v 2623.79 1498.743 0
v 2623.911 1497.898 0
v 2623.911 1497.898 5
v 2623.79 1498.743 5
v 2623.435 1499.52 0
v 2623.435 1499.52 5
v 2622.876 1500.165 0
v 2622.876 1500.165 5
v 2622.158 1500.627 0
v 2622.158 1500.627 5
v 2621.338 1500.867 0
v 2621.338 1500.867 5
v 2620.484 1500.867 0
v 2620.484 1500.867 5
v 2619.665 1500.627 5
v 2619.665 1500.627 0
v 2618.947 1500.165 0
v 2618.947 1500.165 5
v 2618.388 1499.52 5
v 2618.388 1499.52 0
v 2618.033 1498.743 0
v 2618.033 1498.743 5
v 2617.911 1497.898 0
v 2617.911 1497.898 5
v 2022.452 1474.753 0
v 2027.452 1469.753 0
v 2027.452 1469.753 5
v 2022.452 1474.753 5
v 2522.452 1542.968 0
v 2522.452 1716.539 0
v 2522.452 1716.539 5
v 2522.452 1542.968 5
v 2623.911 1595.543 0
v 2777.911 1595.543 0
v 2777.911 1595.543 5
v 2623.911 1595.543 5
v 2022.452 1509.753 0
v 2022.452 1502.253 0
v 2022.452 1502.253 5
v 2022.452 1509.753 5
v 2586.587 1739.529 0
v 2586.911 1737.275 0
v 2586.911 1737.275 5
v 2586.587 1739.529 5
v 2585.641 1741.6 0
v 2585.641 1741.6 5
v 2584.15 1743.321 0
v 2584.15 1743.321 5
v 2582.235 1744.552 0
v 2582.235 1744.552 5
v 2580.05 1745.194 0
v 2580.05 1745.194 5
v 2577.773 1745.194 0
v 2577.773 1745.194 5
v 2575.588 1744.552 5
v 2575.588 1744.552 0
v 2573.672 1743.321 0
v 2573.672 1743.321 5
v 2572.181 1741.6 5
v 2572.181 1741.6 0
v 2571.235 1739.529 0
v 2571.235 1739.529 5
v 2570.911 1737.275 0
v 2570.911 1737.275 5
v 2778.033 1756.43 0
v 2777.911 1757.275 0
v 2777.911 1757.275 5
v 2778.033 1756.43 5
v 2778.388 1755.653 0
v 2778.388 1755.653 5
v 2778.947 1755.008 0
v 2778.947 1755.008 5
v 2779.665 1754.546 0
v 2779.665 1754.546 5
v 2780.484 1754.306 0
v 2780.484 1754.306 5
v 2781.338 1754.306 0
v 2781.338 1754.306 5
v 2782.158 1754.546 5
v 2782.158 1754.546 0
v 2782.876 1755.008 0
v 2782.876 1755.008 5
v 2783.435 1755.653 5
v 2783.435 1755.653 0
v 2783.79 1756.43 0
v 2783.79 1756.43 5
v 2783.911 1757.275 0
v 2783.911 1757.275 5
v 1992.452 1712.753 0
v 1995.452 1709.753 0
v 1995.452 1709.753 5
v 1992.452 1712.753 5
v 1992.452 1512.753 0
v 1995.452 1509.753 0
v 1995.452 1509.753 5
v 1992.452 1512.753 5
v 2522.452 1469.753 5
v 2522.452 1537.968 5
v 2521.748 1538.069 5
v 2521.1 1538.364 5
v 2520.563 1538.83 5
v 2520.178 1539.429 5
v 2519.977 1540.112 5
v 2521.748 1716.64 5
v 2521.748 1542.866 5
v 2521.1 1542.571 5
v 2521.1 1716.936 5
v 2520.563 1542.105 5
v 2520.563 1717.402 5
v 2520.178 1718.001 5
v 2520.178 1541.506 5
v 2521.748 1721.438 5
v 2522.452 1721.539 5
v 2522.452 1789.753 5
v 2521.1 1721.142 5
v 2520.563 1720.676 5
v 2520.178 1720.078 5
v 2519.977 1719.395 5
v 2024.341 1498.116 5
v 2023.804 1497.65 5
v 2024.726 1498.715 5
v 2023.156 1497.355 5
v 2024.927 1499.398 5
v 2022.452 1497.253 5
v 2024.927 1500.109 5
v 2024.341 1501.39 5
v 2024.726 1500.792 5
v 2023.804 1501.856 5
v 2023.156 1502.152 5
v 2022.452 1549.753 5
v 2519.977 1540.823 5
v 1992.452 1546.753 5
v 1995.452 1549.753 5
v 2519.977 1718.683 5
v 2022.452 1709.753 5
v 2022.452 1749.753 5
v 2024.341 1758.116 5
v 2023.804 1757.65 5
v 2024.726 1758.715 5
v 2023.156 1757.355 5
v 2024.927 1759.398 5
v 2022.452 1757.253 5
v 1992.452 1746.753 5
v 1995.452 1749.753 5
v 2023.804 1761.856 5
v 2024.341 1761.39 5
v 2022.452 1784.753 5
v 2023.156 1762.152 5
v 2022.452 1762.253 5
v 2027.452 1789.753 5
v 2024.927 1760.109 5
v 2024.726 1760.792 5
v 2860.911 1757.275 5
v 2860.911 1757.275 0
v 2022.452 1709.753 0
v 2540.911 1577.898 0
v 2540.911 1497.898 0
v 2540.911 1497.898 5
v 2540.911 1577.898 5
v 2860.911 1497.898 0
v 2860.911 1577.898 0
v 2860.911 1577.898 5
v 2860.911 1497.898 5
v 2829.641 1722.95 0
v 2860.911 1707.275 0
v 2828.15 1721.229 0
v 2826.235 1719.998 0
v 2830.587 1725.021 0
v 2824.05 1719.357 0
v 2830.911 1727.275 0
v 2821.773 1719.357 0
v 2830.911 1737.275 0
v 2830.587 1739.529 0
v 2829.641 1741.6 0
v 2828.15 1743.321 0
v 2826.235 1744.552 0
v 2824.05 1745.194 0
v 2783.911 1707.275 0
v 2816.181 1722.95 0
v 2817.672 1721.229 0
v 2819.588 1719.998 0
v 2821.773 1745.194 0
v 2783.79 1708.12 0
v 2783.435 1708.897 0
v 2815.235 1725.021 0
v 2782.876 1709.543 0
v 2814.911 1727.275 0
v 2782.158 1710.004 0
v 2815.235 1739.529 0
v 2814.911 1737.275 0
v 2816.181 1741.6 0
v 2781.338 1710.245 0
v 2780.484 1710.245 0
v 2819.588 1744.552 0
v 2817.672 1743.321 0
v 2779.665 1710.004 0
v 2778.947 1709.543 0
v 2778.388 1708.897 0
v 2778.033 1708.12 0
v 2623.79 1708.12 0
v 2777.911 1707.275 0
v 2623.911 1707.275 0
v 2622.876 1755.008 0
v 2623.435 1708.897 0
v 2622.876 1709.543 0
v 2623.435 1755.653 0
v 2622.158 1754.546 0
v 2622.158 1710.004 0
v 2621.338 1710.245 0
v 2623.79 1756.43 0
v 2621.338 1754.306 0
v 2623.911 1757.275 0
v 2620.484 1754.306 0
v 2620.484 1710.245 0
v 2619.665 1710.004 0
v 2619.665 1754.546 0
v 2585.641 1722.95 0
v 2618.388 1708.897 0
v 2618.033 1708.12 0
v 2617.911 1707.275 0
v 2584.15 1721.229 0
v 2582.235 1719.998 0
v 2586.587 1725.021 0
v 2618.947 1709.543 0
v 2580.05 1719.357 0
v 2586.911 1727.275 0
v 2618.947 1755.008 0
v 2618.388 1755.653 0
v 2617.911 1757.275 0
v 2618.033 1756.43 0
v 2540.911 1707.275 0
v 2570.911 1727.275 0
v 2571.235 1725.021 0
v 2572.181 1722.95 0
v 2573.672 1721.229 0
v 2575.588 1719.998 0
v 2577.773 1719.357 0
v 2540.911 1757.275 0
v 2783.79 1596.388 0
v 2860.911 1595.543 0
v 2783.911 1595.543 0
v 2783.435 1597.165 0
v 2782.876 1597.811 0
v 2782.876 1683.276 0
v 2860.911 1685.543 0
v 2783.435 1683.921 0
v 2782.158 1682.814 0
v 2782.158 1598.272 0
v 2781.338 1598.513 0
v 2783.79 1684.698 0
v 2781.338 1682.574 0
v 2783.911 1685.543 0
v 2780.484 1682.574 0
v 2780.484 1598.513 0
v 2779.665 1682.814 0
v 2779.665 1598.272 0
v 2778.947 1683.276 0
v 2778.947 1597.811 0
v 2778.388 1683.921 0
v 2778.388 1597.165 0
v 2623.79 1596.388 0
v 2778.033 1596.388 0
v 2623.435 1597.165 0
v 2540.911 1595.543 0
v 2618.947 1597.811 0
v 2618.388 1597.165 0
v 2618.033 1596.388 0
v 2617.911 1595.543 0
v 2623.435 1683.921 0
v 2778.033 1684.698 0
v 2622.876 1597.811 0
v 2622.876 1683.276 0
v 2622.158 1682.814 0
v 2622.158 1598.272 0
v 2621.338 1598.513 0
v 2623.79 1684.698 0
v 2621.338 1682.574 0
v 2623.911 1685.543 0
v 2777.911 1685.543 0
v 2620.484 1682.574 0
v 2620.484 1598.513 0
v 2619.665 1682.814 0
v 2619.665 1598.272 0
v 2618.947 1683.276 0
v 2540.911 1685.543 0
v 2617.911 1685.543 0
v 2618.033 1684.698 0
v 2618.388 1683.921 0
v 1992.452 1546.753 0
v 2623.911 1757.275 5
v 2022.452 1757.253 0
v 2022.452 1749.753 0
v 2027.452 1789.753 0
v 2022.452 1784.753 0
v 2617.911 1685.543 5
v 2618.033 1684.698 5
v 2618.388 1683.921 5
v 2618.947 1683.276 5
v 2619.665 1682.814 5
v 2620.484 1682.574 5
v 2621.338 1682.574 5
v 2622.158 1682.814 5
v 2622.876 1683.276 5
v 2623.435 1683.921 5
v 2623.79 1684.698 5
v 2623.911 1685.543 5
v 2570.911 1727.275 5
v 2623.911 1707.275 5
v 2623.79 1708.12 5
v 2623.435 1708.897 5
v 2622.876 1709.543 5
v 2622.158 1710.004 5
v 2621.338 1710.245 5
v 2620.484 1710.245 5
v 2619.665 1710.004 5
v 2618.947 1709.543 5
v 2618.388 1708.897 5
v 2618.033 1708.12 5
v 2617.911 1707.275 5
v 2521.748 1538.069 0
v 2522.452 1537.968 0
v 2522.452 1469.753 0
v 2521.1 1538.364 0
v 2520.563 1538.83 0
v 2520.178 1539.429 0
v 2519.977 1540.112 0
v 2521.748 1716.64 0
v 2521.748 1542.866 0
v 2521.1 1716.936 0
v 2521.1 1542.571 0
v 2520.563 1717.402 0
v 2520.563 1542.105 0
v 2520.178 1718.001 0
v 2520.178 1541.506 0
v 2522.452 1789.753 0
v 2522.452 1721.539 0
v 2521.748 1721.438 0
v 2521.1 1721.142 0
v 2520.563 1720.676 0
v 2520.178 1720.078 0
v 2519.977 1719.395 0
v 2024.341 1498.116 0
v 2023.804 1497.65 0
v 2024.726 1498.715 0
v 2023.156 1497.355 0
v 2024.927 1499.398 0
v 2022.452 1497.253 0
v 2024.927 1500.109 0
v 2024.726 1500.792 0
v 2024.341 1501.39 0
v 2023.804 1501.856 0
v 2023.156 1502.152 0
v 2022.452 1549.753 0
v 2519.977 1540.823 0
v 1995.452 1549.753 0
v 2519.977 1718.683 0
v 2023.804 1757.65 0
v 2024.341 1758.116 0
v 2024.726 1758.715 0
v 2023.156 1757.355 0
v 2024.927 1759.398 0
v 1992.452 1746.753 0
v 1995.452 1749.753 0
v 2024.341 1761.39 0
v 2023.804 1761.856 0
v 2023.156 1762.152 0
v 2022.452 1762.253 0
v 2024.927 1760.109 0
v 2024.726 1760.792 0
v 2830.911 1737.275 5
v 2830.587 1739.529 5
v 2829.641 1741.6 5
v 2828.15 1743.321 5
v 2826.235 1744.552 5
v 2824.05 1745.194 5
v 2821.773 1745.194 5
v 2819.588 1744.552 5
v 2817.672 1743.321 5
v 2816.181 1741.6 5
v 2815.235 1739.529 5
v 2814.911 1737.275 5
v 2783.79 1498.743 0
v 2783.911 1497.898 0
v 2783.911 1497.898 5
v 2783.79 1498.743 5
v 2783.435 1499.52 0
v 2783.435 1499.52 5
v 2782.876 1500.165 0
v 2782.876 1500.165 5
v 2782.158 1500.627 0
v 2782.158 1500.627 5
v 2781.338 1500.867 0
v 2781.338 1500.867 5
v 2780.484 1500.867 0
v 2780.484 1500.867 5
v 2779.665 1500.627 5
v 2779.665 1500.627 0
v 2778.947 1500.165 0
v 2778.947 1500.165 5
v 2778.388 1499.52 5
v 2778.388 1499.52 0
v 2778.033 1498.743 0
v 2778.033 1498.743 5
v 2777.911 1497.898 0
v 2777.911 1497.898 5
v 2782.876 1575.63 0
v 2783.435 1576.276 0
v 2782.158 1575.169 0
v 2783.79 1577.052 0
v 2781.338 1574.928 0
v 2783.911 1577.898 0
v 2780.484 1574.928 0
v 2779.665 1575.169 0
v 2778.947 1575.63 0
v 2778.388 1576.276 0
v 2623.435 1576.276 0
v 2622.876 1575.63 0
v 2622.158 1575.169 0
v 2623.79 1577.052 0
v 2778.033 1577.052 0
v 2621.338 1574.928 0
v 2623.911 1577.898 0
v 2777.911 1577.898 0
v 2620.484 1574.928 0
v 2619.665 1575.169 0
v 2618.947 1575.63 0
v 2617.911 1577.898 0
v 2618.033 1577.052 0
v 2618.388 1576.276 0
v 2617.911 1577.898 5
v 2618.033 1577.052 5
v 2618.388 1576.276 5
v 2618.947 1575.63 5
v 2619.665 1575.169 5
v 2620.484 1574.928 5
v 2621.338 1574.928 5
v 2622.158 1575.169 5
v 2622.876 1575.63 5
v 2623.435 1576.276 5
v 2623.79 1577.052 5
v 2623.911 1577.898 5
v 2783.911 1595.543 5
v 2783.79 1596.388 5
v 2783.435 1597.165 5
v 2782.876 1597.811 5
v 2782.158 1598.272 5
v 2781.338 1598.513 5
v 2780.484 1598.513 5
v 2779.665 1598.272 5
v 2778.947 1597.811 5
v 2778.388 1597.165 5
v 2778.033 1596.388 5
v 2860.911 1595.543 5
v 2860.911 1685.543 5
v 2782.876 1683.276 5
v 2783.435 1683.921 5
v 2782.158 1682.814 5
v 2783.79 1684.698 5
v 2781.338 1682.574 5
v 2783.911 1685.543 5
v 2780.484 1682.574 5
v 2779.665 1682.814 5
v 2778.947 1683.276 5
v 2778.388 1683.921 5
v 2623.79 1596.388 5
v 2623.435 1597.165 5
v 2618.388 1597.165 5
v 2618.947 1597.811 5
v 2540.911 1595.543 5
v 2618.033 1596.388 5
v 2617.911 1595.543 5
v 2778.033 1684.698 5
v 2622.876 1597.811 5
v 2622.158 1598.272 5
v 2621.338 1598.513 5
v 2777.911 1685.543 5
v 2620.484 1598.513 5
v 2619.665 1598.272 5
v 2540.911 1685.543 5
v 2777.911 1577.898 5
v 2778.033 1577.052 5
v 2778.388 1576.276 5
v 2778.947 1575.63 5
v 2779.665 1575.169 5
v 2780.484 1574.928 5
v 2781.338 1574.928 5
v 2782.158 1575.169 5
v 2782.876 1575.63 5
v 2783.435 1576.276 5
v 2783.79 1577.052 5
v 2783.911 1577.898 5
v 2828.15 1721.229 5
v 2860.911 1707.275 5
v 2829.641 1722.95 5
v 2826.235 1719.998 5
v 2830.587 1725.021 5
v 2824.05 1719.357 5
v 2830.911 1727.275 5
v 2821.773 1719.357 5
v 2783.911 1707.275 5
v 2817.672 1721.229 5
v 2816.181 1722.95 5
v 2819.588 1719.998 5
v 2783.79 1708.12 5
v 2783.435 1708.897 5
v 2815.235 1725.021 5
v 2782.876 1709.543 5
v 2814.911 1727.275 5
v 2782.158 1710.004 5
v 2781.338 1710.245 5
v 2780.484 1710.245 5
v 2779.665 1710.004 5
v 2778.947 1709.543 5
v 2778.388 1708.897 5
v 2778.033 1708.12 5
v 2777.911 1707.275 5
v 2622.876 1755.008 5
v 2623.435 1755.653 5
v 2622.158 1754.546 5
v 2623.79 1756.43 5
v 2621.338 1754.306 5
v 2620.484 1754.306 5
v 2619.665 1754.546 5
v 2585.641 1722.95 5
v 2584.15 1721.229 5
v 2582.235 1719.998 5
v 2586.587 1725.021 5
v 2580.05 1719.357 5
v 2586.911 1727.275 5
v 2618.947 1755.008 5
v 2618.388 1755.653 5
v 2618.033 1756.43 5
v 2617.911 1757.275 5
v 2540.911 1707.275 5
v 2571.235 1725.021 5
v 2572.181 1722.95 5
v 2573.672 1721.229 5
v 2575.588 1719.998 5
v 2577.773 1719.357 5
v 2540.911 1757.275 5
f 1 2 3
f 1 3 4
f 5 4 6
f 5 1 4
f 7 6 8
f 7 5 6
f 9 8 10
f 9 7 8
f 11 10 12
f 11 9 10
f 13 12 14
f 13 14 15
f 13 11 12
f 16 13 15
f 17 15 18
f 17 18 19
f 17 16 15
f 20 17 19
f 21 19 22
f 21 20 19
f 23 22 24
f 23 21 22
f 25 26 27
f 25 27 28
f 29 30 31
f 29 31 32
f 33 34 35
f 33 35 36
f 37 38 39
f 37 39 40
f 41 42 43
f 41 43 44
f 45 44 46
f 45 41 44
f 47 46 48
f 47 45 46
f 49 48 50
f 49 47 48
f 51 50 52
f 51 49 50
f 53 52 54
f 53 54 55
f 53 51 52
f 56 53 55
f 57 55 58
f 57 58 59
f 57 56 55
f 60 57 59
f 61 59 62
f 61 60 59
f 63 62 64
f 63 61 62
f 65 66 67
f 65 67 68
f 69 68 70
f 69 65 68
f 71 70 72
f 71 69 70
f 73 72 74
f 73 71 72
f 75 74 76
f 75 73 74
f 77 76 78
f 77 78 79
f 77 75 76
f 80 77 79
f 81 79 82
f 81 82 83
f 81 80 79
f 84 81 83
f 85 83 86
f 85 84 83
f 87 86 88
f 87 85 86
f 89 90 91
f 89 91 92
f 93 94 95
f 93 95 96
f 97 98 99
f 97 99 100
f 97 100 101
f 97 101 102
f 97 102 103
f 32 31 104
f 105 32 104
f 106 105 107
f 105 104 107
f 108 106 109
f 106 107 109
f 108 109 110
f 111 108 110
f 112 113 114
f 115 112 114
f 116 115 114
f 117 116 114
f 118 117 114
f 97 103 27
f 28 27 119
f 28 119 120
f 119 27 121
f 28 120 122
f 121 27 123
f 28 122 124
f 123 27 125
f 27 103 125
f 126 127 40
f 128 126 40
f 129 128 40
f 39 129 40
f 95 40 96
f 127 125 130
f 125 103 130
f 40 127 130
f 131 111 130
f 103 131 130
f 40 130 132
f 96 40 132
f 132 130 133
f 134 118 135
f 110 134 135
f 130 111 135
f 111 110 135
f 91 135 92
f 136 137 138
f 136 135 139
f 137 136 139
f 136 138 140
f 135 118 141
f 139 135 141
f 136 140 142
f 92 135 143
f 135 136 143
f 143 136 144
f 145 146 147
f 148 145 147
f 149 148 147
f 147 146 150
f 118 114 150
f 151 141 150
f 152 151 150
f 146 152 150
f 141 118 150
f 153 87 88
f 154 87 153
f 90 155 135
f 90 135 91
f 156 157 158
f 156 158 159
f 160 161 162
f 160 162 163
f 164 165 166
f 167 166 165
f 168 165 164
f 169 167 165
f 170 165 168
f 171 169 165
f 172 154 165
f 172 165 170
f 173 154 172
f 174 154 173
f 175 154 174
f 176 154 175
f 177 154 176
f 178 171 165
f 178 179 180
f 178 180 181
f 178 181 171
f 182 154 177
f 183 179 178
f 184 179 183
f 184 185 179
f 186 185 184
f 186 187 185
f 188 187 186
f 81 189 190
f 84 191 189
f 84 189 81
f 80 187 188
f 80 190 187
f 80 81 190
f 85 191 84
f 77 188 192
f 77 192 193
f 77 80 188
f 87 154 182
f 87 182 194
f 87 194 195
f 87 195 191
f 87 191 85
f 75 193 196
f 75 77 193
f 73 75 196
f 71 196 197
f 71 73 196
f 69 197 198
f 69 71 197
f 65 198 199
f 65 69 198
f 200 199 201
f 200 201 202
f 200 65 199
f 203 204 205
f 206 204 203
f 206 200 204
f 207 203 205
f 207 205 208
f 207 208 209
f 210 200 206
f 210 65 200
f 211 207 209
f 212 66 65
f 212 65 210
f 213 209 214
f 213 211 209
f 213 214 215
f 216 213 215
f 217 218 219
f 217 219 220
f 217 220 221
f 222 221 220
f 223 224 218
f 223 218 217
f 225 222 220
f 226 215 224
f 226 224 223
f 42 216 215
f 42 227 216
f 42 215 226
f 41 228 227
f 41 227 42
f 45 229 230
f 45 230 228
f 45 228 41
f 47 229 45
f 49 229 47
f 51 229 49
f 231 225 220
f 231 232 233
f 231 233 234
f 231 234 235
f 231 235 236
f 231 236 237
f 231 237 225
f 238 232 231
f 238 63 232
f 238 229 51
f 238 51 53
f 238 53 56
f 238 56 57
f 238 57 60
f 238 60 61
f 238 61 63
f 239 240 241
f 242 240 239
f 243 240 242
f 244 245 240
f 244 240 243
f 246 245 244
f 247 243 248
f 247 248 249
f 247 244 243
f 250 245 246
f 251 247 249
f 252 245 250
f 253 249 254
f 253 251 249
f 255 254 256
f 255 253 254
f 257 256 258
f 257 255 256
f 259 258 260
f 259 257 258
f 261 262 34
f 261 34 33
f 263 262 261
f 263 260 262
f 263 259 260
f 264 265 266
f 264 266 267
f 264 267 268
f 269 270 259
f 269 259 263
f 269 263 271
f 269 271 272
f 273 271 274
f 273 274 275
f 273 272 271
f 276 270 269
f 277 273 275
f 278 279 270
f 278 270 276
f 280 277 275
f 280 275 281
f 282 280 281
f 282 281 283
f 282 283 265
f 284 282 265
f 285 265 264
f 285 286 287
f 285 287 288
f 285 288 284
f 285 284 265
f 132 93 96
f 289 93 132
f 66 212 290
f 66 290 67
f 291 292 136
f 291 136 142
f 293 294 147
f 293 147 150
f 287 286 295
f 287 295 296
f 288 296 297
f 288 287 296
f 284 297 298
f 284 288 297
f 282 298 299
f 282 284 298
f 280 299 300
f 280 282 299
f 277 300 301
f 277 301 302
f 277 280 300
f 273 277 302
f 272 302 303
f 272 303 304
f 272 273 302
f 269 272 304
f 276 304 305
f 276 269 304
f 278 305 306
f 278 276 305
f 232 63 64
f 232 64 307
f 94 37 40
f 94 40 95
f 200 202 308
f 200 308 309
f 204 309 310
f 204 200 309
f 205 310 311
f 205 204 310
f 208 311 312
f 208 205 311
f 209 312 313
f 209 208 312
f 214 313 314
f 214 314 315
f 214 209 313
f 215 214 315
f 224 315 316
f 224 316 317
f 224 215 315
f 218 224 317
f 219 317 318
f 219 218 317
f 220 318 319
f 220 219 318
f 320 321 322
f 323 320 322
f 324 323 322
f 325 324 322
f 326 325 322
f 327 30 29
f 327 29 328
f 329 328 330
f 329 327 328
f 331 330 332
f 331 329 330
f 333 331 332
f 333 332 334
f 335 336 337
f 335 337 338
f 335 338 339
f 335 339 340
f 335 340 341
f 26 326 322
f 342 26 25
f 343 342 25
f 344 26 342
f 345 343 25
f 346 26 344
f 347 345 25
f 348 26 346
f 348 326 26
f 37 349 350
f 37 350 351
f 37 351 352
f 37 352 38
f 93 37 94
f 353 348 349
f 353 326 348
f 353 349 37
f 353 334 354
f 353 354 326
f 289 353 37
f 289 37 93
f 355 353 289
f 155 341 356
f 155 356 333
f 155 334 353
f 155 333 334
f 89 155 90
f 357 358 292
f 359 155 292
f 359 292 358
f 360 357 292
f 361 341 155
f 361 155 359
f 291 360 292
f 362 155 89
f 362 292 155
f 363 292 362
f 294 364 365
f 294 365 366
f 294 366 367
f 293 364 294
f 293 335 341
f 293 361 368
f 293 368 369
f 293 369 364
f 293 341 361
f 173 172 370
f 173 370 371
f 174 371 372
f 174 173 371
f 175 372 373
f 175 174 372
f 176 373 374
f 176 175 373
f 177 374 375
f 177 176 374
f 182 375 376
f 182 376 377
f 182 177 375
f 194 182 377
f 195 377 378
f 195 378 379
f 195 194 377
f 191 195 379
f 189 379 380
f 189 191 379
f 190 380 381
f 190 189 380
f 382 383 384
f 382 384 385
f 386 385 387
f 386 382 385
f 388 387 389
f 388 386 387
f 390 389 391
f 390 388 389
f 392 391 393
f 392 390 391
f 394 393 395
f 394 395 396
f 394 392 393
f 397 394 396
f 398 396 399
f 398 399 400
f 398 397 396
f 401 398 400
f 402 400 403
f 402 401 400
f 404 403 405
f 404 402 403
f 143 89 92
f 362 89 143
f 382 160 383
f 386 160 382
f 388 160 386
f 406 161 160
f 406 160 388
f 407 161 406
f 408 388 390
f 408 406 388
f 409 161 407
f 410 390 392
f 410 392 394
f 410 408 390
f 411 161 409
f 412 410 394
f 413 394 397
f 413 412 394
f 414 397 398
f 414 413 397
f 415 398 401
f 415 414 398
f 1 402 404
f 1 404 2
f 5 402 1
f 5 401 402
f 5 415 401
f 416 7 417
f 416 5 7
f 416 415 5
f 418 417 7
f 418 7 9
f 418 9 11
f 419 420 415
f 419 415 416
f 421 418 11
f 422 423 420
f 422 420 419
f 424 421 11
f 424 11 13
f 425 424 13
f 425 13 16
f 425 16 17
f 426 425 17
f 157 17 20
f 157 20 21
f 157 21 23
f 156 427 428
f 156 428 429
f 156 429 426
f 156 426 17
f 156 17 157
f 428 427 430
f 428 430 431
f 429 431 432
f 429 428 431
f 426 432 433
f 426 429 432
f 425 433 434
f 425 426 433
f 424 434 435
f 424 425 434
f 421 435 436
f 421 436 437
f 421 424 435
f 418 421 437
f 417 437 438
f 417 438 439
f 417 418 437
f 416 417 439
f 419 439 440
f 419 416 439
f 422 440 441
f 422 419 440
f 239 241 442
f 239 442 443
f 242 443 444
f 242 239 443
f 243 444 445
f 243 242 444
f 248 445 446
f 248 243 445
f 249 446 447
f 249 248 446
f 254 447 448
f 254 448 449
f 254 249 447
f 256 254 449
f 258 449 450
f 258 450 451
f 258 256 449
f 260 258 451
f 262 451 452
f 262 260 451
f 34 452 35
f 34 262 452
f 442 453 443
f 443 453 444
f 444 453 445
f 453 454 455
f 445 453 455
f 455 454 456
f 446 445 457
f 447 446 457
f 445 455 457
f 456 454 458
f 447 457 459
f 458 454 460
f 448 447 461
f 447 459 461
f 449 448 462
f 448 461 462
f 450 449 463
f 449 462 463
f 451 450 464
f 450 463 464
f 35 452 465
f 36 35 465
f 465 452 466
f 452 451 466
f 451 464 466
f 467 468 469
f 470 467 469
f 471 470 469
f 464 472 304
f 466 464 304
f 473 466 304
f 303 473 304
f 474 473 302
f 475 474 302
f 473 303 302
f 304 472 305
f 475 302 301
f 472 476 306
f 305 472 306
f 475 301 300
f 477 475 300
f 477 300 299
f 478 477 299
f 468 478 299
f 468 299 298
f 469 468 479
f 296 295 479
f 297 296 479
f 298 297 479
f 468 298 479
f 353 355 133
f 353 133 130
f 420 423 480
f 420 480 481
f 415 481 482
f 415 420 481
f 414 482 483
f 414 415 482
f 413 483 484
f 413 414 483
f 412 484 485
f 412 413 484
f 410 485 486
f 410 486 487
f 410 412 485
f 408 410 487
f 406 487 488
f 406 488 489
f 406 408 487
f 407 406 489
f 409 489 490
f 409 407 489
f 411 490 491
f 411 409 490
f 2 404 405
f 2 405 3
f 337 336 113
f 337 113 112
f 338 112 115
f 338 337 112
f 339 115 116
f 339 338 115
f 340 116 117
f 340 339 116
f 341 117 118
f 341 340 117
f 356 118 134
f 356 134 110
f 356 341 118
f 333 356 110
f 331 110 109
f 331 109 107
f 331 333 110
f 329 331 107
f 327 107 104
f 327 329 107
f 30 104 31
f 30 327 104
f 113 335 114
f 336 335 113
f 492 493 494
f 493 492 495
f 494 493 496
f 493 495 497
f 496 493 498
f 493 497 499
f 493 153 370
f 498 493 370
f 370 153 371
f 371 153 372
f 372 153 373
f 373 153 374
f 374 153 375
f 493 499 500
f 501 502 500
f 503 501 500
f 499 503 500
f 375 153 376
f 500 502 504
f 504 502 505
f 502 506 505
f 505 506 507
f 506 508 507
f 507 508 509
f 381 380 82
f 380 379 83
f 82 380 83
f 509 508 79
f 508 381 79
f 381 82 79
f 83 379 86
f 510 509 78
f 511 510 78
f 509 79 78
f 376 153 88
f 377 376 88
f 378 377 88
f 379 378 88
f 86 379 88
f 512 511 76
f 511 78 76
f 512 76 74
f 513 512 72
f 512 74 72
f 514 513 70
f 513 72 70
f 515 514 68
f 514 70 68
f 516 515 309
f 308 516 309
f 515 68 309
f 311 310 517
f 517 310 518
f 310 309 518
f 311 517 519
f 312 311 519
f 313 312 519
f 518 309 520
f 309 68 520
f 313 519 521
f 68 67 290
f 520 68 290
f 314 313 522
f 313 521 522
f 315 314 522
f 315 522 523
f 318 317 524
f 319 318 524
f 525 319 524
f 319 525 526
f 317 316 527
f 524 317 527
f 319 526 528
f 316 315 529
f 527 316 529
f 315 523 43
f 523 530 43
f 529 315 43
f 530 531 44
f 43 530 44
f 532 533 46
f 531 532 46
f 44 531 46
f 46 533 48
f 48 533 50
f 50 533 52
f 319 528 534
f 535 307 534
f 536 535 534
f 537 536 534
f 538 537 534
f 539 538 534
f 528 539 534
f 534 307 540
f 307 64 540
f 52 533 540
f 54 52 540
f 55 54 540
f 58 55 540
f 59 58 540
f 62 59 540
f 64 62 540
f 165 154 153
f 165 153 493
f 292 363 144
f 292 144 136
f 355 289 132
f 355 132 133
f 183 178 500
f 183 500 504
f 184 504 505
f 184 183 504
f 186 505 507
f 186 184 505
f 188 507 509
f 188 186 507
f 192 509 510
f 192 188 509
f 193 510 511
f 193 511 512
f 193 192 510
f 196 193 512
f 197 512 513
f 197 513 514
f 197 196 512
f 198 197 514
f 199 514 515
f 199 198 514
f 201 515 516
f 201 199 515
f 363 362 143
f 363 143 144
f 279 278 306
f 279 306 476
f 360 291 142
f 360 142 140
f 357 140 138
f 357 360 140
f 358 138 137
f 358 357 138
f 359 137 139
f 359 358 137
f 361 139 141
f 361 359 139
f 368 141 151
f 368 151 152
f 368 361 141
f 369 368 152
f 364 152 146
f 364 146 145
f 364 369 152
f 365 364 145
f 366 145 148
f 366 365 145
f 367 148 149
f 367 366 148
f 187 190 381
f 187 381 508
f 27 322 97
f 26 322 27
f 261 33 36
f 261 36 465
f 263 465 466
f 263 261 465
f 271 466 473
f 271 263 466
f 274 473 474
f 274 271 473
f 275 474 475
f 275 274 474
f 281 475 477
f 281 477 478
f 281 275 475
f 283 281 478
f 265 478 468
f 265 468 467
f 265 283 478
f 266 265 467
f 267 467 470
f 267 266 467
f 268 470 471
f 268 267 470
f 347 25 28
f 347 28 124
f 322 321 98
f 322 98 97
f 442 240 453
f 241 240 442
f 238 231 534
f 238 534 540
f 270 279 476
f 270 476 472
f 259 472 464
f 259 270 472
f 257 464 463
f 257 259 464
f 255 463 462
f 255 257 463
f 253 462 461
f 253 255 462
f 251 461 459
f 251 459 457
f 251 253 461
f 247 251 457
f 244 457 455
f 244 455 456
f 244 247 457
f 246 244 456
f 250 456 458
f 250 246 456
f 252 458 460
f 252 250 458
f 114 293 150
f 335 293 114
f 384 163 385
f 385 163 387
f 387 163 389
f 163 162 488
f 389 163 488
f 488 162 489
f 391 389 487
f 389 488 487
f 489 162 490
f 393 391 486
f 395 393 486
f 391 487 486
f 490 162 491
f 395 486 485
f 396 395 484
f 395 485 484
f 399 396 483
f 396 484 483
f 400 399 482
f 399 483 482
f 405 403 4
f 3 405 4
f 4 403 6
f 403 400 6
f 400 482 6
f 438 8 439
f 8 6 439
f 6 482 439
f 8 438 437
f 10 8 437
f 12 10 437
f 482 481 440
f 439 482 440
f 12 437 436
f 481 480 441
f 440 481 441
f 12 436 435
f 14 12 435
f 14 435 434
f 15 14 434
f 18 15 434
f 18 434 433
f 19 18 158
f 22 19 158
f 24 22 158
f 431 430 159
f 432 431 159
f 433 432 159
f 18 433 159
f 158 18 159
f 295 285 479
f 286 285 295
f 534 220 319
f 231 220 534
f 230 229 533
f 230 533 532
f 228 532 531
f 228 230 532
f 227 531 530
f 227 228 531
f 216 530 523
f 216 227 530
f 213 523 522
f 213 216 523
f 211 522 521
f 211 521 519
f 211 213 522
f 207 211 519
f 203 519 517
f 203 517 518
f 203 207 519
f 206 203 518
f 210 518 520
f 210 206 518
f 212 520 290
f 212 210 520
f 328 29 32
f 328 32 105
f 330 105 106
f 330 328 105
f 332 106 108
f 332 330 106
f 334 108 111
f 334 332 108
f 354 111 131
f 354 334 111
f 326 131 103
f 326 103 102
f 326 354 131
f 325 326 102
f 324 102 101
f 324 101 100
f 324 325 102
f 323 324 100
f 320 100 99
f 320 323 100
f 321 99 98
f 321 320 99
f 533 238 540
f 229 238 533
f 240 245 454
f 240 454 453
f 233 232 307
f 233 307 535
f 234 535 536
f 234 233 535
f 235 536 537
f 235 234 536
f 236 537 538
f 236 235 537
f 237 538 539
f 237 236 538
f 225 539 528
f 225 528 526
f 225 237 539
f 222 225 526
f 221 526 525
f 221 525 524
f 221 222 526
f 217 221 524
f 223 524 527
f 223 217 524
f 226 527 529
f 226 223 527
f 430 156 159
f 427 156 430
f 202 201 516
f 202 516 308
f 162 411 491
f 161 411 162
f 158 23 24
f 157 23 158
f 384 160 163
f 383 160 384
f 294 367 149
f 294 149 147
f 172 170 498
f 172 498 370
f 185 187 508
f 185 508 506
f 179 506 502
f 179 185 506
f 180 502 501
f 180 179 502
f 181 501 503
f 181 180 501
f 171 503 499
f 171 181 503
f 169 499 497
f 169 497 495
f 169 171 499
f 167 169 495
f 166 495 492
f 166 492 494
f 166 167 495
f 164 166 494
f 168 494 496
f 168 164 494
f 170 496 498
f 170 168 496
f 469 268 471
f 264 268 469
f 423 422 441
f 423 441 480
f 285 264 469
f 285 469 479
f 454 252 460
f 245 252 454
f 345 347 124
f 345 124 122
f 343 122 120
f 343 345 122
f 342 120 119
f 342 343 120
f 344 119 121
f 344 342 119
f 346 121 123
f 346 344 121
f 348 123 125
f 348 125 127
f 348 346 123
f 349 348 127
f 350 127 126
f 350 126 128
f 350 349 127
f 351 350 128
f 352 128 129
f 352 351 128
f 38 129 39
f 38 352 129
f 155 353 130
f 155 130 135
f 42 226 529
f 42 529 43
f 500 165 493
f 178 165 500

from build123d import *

# Parameters (mm, degrees)
Y_KSEKLIK_EKSTR_ZYON1_DEPTH   = 5
Y_KSEKLIK_EKSTR_ZYON1_2_DEPTH = 5
Y_KSEKLIK_EKSTR_ZYON1_3_DEPTH = 5
Y_KSEKLIK_EKSTR_ZYON1_4_DEPTH = 5


with BuildPart() as part:
    # Çizim1 → Yükseklik-Ekstrüzyon1 (new body)
    with BuildSketch(Plane.XY):
        with BuildLine():
            ThreePointArc((2022.451963564, 1497.253325842), (2024.951963564, 1499.753325842), (2022.451963564, 1502.253325842))
            Line((2022.451963564, 1502.253325842), (2022.451963564, 1509.753325842))
            Line((2022.451963564, 1509.753325842), (1995.451963564, 1509.753325842))
            Line((1995.451963564, 1509.753325842), (1992.451963564, 1512.753325842))
            Line((1992.451963564, 1512.753325842), (1992.451963564, 1546.753325842))
            Line((1992.451963564, 1546.753325842), (1995.451963564, 1549.753325842))
            Line((1995.451963564, 1549.753325842), (2022.451963564, 1549.753325842))
            Line((2022.451963564, 1549.753325842), (2022.451963564, 1709.753325842))
            Line((2022.451963564, 1709.753325842), (1995.451963564, 1709.753325842))
            Line((1995.451963564, 1709.753325842), (1992.451963564, 1712.753325842))
            Line((1992.451963564, 1712.753325842), (1992.451963564, 1746.753325842))
            Line((1992.451963564, 1746.753325842), (1995.451963564, 1749.753325842))
            Line((1995.451963564, 1749.753325842), (2022.451963564, 1749.753325842))
            Line((2022.451963564, 1749.753325842), (2022.451963564, 1757.253325842))
            ThreePointArc((2022.451963564, 1757.253325842), (2024.951963564, 1759.753325842), (2022.451963564, 1762.253325842))
            Line((2022.451963564, 1762.253325842), (2022.451963564, 1784.753325842))
            Line((2022.451963564, 1784.753325842), (2027.451963564, 1789.753325842))
            Line((2027.451963564, 1789.753325842), (2522.451963564, 1789.753325842))
            Line((2522.451963564, 1789.753325842), (2522.451963564, 1721.539040128))
            ThreePointArc((2522.451963564, 1721.539040128), (2519.951963564, 1719.039040128), (2522.451963564, 1716.539040128))
            Line((2522.451963564, 1716.539040128), (2522.451963564, 1542.967611556))
            ThreePointArc((2522.451963564, 1542.967611556), (2519.951963564, 1540.467611556), (2522.451963564, 1537.967611556))
            Line((2522.451963564, 1537.967611556), (2522.451963564, 1469.753325842))
            Line((2522.451963564, 1469.753325842), (2027.451963564, 1469.753325842))
            Line((2027.451963564, 1469.753325842), (2022.451963564, 1474.753325842))
            Line((2022.451963564, 1474.753325842), (2022.451963564, 1497.253325842))
        make_face()
    extrude(amount=Y_KSEKLIK_EKSTR_ZYON1_DEPTH)


with BuildPart() as body_2:
    # Çizim1 → Y_kseklik-Ekstr_zyon1 2 (new body)
    with BuildSketch(Plane.XY):
        with BuildLine():
            ThreePointArc((2777.91128682, 1757.275271925), (2780.91128682, 1754.275271925), (2783.91128682, 1757.275271925))
            Line((2783.91128682, 1757.275271925), (2860.91128682, 1757.275271925))
            Line((2860.91128682, 1757.275271925), (2860.91128682, 1707.275271925))
            Line((2860.91128682, 1707.275271925), (2783.91128682, 1707.275271925))
            ThreePointArc((2783.91128682, 1707.275271925), (2780.91128682, 1710.275271925), (2777.91128682, 1707.275271925))
            Line((2777.91128682, 1707.275271925), (2623.91128682, 1707.275271925))
            ThreePointArc((2623.91128682, 1707.275271925), (2620.91128682, 1710.275271925), (2617.91128682, 1707.275271925))
            Line((2617.91128682, 1707.275271925), (2540.91128682, 1707.275271925))
            Line((2540.91128682, 1707.275271925), (2540.91128682, 1757.275271925))
            Line((2540.91128682, 1757.275271925), (2617.91128682, 1757.275271925))
            ThreePointArc((2617.91128682, 1757.275271925), (2620.91128682, 1754.275271925), (2623.91128682, 1757.275271925))
            Line((2623.91128682, 1757.275271925), (2777.91128682, 1757.275271925))
        make_face()
        with BuildLine():
            ThreePointArc((2814.91128682, 1727.275271925), (2822.91128682, 1719.275271925), (2830.91128682, 1727.275271925))
            Line((2830.91128682, 1727.275271925), (2830.91128682, 1737.275271925))
            ThreePointArc((2830.91128682, 1737.275271925), (2822.91128682, 1745.275271925), (2814.91128682, 1737.275271925))
            Line((2814.91128682, 1737.275271925), (2814.91128682, 1727.275271925))
        make_face(mode=Mode.SUBTRACT)
        with BuildLine():
            ThreePointArc((2570.91128682, 1727.275271925), (2578.91128682, 1719.275271925), (2586.91128682, 1727.275271925))
            Line((2586.91128682, 1727.275271925), (2586.91128682, 1737.275271925))
            ThreePointArc((2586.91128682, 1737.275271925), (2578.91128682, 1745.275271925), (2570.91128682, 1737.275271925))
            Line((2570.91128682, 1737.275271925), (2570.91128682, 1727.275271925))
        make_face(mode=Mode.SUBTRACT)
    extrude(amount=Y_KSEKLIK_EKSTR_ZYON1_2_DEPTH)


with BuildPart() as body_3:
    # Çizim1 → Y_kseklik-Ekstr_zyon1 3 (new body)
    with BuildSketch(Plane.XY):
        with BuildLine():
            ThreePointArc((2777.91128682, 1685.543295226), (2780.91128682, 1682.543295226), (2783.91128682, 1685.543295226))
            Line((2783.91128682, 1685.543295226), (2860.91128682, 1685.543295226))
            Line((2860.91128682, 1685.543295226), (2860.91128682, 1595.543295226))
            Line((2860.91128682, 1595.543295226), (2783.91128682, 1595.543295226))
            ThreePointArc((2783.91128682, 1595.543295226), (2780.91128682, 1598.543295226), (2777.91128682, 1595.543295226))
            Line((2777.91128682, 1595.543295226), (2623.91128682, 1595.543295226))
            ThreePointArc((2623.91128682, 1595.543295226), (2620.91128682, 1598.543295226), (2617.91128682, 1595.543295226))
            Line((2617.91128682, 1595.543295226), (2540.91128682, 1595.543295226))
            Line((2540.91128682, 1595.543295226), (2540.91128682, 1685.543295226))
            Line((2540.91128682, 1685.543295226), (2617.91128682, 1685.543295226))
            ThreePointArc((2617.91128682, 1685.543295226), (2620.91128682, 1682.543295226), (2623.91128682, 1685.543295226))
            Line((2623.91128682, 1685.543295226), (2777.91128682, 1685.543295226))
        make_face()
    extrude(amount=Y_KSEKLIK_EKSTR_ZYON1_3_DEPTH)


with BuildPart() as body_4:
    # Çizim1 → Y_kseklik-Ekstr_zyon1 4 (new body)
    with BuildSketch(Plane.XY):
        with BuildLine():
            ThreePointArc((2777.91128682, 1577.897609732), (2780.91128682, 1574.897609732), (2783.91128682, 1577.897609732))
            Line((2783.91128682, 1577.897609732), (2860.91128682, 1577.897609732))
            Line((2860.91128682, 1577.897609732), (2860.91128682, 1497.897609732))
            Line((2860.91128682, 1497.897609732), (2783.91128682, 1497.897609732))
            ThreePointArc((2783.91128682, 1497.897609732), (2780.91128682, 1500.897609732), (2777.91128682, 1497.897609732))
            Line((2777.91128682, 1497.897609732), (2623.91128682, 1497.897609732))
            ThreePointArc((2623.91128682, 1497.897609732), (2620.91128682, 1500.897609732), (2617.91128682, 1497.897609732))
            Line((2617.91128682, 1497.897609732), (2540.91128682, 1497.897609732))
            Line((2540.91128682, 1497.897609732), (2540.91128682, 1577.897609732))
            Line((2540.91128682, 1577.897609732), (2617.91128682, 1577.897609732))
            ThreePointArc((2617.91128682, 1577.897609732), (2620.91128682, 1574.897609732), (2623.91128682, 1577.897609732))
            Line((2623.91128682, 1577.897609732), (2777.91128682, 1577.897609732))
        make_face()
    extrude(amount=Y_KSEKLIK_EKSTR_ZYON1_4_DEPTH)


solid = Compound([part.part, body_2.part, body_3.part, body_4.part])
